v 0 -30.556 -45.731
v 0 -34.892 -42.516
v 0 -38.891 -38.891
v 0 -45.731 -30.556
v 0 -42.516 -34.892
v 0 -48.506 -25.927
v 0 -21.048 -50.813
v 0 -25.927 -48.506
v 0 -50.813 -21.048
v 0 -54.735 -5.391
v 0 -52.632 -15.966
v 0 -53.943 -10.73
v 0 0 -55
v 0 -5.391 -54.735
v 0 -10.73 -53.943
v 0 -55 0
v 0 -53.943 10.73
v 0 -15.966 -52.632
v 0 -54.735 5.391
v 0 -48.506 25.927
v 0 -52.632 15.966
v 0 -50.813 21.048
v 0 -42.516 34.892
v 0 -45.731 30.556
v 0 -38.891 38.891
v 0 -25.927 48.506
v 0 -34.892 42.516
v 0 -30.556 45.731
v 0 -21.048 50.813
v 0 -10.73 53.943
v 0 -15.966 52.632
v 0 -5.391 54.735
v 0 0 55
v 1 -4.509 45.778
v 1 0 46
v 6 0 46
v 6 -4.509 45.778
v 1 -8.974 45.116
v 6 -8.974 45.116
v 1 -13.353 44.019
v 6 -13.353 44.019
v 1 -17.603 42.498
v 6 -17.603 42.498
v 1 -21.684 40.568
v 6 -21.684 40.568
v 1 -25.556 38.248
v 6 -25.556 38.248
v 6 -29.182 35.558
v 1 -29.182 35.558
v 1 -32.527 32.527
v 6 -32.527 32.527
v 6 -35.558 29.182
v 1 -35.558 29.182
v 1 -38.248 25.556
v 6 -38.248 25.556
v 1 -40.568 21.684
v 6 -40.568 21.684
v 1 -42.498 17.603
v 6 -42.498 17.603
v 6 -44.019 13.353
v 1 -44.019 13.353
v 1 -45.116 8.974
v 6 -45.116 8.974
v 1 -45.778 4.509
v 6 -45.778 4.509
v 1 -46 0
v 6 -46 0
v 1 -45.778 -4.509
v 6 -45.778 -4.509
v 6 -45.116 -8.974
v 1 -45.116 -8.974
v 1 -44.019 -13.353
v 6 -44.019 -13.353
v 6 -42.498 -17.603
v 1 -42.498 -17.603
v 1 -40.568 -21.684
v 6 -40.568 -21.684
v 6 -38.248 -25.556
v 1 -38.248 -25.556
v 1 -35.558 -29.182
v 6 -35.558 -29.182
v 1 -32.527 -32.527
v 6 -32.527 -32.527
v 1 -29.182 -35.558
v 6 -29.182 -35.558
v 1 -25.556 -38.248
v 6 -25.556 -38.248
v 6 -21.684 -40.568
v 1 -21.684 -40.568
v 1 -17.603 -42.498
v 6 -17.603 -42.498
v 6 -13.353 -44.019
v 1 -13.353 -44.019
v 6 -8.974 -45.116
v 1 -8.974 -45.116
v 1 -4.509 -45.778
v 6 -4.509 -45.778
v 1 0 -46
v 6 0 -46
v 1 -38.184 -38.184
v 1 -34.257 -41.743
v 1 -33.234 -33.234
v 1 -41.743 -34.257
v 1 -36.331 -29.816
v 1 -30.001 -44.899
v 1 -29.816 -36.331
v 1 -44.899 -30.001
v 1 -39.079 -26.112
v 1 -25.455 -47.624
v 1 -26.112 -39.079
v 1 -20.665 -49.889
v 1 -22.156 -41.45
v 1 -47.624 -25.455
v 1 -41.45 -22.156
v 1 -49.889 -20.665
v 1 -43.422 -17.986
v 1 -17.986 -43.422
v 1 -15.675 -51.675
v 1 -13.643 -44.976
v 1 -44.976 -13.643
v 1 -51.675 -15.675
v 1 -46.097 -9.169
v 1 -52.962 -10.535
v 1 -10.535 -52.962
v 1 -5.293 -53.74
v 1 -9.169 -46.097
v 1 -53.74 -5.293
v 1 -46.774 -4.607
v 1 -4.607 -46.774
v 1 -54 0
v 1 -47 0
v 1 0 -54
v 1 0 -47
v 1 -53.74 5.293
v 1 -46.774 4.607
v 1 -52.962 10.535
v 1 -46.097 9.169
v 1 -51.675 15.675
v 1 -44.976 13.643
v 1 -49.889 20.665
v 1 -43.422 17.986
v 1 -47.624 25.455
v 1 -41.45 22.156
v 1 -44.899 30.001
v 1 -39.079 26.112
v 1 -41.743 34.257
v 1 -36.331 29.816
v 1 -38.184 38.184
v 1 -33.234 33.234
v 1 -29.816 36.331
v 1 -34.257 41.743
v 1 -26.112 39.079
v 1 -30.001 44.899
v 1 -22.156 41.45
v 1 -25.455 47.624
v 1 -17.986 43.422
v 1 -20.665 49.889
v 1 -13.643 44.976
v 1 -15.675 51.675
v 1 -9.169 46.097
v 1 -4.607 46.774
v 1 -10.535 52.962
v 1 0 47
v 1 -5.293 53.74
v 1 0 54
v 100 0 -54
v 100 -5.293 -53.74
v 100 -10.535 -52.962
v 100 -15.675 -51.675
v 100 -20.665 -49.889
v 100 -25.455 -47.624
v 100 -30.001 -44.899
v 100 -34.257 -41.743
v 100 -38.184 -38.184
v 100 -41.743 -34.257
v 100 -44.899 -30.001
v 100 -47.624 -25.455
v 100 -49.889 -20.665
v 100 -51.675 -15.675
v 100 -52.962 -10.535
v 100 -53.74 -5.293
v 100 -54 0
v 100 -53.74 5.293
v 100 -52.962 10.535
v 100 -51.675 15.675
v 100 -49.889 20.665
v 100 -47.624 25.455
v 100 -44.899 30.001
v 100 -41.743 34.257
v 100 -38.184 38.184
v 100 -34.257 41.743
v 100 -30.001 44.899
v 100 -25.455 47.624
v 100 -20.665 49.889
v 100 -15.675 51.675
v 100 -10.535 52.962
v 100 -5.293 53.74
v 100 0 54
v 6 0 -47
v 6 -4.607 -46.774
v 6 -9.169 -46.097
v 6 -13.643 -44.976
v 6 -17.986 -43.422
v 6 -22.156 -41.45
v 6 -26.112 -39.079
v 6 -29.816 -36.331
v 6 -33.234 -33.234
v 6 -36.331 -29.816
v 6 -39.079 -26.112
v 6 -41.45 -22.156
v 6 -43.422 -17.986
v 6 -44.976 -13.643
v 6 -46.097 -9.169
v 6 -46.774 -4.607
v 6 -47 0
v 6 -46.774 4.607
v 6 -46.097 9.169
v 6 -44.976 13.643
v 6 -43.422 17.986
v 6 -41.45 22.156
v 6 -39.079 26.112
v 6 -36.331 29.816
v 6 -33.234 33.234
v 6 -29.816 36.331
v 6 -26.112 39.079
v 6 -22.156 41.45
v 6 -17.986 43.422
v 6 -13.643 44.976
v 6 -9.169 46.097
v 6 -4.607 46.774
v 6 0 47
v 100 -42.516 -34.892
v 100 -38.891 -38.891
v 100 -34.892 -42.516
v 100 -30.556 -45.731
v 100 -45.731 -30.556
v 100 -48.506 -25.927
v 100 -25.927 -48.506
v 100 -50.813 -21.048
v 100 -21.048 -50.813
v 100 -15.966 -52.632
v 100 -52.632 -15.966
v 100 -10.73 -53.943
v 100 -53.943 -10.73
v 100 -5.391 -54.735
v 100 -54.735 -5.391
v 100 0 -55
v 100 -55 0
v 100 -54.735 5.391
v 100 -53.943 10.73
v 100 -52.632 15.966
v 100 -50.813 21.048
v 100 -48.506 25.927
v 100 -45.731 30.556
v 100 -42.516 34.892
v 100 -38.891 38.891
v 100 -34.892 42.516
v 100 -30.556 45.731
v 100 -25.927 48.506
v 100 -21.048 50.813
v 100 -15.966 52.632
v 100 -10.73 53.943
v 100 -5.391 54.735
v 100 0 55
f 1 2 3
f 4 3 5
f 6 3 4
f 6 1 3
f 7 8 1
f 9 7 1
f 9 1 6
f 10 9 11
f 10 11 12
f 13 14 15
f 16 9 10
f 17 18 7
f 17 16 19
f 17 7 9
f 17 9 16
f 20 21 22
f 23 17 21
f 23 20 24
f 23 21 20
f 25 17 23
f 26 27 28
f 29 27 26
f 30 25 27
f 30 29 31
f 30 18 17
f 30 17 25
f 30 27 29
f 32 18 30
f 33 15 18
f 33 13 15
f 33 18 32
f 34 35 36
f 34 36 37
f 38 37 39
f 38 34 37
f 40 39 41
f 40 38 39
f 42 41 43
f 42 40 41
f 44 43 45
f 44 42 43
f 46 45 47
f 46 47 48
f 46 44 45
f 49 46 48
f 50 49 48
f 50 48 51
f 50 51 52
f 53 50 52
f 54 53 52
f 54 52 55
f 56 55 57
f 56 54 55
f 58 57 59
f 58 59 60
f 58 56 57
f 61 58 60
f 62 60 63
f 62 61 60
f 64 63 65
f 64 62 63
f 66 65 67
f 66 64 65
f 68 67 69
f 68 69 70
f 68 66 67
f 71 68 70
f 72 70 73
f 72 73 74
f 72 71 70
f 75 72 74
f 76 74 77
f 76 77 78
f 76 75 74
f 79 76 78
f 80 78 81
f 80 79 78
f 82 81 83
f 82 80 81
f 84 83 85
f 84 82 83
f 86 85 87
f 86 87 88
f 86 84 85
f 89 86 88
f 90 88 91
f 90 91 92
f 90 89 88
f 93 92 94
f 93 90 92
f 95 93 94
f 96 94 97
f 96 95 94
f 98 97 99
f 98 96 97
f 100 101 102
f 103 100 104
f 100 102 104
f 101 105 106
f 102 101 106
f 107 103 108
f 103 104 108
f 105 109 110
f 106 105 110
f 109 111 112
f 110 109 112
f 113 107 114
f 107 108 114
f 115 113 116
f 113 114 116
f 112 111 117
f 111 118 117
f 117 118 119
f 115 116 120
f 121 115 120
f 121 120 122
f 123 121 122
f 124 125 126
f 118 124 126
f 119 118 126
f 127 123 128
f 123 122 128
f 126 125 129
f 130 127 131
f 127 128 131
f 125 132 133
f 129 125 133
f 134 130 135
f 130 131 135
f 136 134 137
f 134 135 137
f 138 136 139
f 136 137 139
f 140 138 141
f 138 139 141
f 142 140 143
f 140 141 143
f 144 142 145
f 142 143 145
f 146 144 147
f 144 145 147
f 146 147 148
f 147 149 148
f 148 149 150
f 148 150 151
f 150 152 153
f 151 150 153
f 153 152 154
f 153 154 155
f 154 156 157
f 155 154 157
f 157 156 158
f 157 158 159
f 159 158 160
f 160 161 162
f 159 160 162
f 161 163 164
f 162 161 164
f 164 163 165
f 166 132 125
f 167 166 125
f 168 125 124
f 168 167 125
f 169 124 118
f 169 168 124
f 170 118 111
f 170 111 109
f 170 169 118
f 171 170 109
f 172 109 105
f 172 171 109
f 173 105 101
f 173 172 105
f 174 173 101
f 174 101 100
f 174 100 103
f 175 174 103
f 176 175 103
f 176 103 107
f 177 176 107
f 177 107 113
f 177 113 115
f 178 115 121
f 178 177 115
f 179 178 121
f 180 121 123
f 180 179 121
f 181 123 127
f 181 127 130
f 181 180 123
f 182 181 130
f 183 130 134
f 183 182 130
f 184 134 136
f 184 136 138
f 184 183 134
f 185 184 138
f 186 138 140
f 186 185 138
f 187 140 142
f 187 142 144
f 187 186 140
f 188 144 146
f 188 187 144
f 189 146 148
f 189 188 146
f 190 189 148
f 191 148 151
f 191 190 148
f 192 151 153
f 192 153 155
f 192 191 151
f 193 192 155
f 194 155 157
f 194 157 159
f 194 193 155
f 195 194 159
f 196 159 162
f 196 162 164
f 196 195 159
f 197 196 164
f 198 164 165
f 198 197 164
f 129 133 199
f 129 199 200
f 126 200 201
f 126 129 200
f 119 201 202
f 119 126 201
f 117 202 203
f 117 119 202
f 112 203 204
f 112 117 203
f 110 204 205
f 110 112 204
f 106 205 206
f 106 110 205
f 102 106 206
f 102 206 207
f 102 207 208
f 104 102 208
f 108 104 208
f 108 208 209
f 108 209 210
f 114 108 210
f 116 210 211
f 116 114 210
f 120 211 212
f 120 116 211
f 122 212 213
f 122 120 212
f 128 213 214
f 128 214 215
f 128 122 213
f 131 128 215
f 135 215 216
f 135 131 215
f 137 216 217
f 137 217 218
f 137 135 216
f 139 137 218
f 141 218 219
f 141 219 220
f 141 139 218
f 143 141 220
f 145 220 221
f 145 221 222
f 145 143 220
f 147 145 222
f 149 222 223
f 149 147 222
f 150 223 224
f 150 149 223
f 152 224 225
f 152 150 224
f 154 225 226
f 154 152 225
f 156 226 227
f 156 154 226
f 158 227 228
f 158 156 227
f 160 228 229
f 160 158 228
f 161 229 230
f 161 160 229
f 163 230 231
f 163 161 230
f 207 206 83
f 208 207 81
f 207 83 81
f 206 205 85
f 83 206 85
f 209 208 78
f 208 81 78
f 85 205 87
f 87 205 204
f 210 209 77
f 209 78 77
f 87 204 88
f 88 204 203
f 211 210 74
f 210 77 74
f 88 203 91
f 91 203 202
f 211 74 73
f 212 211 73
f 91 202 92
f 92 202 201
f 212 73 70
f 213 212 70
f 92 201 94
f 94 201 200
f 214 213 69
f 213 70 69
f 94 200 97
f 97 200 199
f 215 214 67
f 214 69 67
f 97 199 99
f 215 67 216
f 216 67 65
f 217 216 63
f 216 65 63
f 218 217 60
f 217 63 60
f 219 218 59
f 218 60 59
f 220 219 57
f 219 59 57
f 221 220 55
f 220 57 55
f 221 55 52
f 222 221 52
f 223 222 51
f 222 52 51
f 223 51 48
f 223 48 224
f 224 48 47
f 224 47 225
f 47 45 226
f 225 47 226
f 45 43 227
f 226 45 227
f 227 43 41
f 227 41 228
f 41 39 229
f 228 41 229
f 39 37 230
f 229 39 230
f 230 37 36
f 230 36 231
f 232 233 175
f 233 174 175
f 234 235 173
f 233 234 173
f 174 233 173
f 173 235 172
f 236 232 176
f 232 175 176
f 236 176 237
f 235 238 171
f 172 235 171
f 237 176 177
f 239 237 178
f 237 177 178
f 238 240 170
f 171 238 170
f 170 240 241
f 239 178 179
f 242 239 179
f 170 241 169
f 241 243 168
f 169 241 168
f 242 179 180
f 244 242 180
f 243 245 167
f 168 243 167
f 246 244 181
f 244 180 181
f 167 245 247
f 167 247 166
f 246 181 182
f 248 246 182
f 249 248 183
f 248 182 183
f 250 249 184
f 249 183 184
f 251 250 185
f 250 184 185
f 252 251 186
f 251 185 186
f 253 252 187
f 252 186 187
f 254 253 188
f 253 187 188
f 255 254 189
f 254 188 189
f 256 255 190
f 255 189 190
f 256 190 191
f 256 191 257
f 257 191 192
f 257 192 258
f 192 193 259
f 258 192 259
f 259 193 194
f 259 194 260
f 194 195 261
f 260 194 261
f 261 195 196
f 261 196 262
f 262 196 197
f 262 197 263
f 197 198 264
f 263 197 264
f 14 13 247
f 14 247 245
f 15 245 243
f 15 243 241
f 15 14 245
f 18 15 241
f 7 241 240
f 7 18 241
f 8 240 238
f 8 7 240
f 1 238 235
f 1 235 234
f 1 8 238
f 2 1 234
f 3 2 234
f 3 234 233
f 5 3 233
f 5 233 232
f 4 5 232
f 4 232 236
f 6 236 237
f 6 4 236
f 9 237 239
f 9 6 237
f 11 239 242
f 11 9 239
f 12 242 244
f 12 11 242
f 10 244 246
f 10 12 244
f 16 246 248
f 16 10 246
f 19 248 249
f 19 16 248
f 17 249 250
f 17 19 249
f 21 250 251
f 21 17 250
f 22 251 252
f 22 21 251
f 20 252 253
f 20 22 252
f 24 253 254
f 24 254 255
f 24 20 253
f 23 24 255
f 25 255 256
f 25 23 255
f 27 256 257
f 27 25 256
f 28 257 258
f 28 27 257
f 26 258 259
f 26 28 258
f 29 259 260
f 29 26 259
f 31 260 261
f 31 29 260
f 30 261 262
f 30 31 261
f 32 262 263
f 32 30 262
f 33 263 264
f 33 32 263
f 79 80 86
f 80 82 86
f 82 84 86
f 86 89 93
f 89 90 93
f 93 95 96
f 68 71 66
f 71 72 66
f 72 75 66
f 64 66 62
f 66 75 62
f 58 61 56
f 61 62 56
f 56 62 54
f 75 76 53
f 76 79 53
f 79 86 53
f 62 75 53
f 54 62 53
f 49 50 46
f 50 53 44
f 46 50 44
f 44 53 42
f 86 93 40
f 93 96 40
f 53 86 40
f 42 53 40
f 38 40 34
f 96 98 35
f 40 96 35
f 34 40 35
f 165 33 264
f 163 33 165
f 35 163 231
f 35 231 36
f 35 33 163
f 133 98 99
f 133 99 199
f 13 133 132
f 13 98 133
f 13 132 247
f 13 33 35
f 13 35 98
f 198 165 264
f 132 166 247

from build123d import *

# Parameters (mm, degrees)
BOSS_EXTRUDE2_DEPTH = 100
CUT_EXTRUDE1_DEPTH  = 99
EXTRUDE_THIN1_DEPTH = 5


with BuildPart() as part:
    # Sketch1 → Boss-Extrude2 (new body)
    with BuildSketch(Plane(origin=(0, 0, 0), x_dir=(0, 0, -1), z_dir=(1, 0, 0))):
        with BuildLine():
            Line((-55, 0), (55, 0))
            ThreePointArc((55, 0), (0, -55), (-55, 0))
        make_face()
    extrude(amount=BOSS_EXTRUDE2_DEPTH)

    # Sketch5 → Cut-Extrude1 (cut)
    with BuildSketch(Plane(origin=(100, 0, 0), x_dir=(0, 0, -1), z_dir=(1, 0, 0))):
        with BuildLine():
            Line((-54, 0), (54, 0))
            ThreePointArc((54, 0), (0, -54), (-54, 0))
        make_face()
    extrude(amount=-CUT_EXTRUDE1_DEPTH, mode=Mode.SUBTRACT)

    # Sketch6 → Extrude-Thin1 (add)
    with BuildSketch(Plane(origin=(1, 0, 0), x_dir=(0, 0, -1), z_dir=(1, 0, 0))):
        with BuildLine():
            ThreePointArc((47, 0), (0, -47), (-47, 0))
            Line((-47, 0), (-46, 0))
            ThreePointArc((-46, 0), (0, -46), (46, 0))
            Line((46, 0), (47, 0))
        make_face()
    extrude(amount=EXTRUDE_THIN1_DEPTH)


solid = part.part
